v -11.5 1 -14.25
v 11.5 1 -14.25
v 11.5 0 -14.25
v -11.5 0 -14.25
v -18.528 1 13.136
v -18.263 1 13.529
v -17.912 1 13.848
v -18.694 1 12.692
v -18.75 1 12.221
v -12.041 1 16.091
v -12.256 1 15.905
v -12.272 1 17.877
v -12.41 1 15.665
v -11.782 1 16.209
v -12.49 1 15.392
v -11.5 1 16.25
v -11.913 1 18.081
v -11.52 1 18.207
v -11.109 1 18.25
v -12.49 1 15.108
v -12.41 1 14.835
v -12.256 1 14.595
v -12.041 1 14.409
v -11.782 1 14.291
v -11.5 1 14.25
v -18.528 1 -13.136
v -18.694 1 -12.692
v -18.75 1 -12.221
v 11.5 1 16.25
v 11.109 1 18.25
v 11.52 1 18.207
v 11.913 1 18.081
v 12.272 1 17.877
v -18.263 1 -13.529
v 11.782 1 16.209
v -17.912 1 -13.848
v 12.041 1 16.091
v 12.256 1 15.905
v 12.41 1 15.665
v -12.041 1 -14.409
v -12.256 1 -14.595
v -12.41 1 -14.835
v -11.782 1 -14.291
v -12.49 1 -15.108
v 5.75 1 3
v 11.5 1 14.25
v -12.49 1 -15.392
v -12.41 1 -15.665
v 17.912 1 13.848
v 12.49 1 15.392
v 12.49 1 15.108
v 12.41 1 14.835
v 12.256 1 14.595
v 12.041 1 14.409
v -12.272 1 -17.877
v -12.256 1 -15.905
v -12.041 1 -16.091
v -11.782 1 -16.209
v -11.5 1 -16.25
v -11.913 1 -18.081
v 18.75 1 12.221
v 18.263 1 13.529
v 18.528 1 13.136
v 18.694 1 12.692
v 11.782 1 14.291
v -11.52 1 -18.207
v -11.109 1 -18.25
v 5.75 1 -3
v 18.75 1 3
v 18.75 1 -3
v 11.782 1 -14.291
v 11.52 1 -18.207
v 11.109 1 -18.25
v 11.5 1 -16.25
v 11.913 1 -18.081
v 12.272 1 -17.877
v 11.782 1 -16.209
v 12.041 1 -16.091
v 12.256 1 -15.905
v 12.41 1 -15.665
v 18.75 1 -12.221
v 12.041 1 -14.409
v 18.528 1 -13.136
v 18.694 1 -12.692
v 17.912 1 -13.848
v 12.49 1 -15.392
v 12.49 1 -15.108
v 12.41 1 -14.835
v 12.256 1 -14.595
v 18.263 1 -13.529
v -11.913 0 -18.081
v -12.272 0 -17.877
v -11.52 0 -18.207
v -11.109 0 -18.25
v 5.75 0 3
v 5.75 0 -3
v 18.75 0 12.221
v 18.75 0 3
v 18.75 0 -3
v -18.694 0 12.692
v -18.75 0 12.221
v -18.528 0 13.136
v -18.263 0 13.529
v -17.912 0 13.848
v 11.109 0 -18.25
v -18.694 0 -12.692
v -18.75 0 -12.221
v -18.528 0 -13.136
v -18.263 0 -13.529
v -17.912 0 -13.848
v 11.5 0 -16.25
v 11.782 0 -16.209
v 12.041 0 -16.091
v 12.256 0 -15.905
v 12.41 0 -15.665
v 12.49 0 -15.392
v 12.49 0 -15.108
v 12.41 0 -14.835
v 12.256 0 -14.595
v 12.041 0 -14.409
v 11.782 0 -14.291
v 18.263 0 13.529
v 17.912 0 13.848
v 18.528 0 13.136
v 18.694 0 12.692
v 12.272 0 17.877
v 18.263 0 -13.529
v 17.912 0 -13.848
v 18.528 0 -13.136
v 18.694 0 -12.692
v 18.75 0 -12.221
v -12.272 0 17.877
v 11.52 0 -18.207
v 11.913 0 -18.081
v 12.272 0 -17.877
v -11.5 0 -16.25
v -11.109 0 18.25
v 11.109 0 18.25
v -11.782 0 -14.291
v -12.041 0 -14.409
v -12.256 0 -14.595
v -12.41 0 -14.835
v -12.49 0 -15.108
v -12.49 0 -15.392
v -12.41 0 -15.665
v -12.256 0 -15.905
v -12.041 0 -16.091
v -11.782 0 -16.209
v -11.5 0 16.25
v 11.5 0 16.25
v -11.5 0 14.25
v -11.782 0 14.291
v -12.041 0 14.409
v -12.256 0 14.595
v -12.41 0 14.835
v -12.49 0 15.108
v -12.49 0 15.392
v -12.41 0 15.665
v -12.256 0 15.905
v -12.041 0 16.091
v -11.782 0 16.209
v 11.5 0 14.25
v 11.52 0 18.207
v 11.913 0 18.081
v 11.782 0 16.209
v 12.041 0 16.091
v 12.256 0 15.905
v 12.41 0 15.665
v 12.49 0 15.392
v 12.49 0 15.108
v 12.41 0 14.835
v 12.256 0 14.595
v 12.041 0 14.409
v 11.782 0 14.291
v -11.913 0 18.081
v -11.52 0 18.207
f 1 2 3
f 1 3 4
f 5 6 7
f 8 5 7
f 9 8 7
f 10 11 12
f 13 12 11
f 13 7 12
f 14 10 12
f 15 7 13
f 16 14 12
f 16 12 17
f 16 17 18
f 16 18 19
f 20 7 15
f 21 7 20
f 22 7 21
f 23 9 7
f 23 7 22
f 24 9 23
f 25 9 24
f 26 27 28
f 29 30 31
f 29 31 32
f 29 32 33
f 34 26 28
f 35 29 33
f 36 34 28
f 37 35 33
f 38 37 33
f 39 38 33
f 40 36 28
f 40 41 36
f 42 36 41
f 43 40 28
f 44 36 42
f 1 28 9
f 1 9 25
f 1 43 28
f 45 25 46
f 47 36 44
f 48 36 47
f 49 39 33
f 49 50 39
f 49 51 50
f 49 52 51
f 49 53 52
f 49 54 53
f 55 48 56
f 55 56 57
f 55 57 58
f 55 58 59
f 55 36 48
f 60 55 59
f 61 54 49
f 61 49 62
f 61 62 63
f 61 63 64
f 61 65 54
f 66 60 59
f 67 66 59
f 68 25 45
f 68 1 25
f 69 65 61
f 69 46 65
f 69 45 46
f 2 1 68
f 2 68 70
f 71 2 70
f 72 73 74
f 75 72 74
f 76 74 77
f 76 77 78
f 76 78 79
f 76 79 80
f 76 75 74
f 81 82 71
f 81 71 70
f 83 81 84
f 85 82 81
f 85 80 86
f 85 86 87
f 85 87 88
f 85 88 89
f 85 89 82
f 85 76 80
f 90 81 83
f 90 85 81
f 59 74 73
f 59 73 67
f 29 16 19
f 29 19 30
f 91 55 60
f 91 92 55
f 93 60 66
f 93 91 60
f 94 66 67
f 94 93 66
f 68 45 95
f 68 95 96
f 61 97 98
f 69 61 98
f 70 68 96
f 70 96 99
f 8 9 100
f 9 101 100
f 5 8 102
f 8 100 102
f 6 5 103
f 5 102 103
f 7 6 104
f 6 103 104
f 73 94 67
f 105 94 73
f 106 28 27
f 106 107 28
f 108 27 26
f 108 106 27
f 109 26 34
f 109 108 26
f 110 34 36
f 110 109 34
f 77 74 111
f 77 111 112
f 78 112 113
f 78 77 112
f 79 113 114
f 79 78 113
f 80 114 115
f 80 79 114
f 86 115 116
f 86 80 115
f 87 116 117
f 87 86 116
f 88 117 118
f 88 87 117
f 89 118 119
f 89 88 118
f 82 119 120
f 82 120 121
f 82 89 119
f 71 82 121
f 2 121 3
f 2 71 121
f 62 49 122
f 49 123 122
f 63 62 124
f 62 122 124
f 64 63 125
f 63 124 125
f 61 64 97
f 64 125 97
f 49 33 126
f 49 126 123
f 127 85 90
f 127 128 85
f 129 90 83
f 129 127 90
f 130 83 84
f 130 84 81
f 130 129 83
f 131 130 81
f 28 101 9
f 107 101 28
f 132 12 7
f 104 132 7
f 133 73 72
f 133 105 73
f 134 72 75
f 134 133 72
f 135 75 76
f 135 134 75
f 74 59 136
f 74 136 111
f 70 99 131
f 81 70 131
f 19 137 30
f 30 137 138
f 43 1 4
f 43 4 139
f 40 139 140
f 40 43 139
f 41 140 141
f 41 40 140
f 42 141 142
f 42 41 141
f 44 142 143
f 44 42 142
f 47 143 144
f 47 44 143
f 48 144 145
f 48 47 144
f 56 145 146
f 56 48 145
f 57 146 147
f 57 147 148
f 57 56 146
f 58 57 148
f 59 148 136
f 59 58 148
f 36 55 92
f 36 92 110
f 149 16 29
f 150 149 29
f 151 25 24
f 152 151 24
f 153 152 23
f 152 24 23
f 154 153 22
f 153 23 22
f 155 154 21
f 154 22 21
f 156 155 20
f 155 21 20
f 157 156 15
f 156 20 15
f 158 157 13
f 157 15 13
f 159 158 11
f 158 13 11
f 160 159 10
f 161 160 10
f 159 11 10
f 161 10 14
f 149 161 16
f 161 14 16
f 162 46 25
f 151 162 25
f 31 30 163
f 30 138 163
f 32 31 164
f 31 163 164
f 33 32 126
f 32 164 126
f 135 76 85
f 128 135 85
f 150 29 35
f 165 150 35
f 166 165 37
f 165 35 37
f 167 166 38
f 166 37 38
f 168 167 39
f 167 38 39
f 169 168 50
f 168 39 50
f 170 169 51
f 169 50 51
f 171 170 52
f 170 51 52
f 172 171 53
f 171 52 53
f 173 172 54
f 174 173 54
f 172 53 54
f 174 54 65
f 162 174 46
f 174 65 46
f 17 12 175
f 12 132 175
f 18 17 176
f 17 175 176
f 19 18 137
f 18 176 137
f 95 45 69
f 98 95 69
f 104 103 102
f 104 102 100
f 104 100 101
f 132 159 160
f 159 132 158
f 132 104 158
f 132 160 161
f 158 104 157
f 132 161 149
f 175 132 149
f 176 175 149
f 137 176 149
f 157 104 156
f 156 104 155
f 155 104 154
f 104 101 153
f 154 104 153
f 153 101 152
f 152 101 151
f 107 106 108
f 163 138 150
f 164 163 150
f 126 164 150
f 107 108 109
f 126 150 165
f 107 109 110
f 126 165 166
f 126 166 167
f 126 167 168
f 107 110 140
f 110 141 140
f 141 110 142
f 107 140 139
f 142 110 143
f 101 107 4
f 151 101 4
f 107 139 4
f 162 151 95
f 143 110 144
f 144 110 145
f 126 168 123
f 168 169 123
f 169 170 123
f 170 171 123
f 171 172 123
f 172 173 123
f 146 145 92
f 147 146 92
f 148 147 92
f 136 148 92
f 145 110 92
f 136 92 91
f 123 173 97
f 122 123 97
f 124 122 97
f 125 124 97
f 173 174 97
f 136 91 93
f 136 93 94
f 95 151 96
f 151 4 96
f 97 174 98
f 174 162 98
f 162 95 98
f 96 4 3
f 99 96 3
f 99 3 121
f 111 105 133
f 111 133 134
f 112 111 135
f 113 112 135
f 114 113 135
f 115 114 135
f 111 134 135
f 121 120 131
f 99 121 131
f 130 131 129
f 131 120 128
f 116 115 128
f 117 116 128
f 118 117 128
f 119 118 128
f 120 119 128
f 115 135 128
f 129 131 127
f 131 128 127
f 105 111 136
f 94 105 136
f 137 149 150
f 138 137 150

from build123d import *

# Parameters (mm, degrees)
SKETCH_1_W          = 37.5
SKETCH_1_H          = 36.5
EXTRUDE_1_DEPTH     = 1
CUT_EXTRUDE_1_DEPTH = 1
CUT_EXTRUDE_2_DEPTH = 1
FILLET_1_R          = 2
SKETCH_4_W          = 13
SKETCH_4_H          = 6
CUT_EXTRUDE_3_DEPTH = 1


with BuildPart() as part:
    # 草图1 → 凸台-拉伸1 (new body)
    with BuildSketch(Plane(origin=(0, 0, 0), x_dir=(1, 0, 0), z_dir=(0, 1, 0))):
        Rectangle(SKETCH_1_W, SKETCH_1_H)
    extrude(amount=EXTRUDE_1_DEPTH)

    # 草图2 → 切除-拉伸1 (cut)
    with BuildSketch(Plane(origin=(0, 1, 0), x_dir=(1, 0, 0), z_dir=(0, 1, 0))):
        Polygon((-11.75, 18.25), (-18.75, 13.25), (-18.75, 18.25), align=None)
        Polygon((18.75, 18.25), (11.75, 18.25), (18.75, 13.25), align=None)
        Polygon((11.75, -18.25), (18.75, -13.25), (18.75, -18.25), align=None)
        Polygon((-18.75, -18.25), (-11.75, -18.25), (-18.75, -13.25), align=None)
    extrude(amount=-CUT_EXTRUDE_1_DEPTH, mode=Mode.SUBTRACT)

    # 草图3 → 切除-拉伸2 (cut)
    with BuildSketch(Plane(origin=(0, 1, 0), x_dir=(1, 0, 0), z_dir=(0, 1, 0))):
        with BuildLine():
            Line((-11.5, 16.25), (11.5, 16.25))
            ThreePointArc((11.5, 16.25), (12.5, 15.25), (11.5, 14.25))
            Line((11.5, 14.25), (-11.5, 14.25))
            ThreePointArc((-11.5, 14.25), (-12.5, 15.25), (-11.5, 16.25))
        make_face()
        with BuildLine():
            Line((-11.5, -16.25), (11.5, -16.25))
            ThreePointArc((11.5, -16.25), (12.5, -15.25), (11.5, -14.25))
            Line((11.5, -14.25), (-11.5, -14.25))
            ThreePointArc((-11.5, -14.25), (-12.5, -15.25), (-11.5, -16.25))
        make_face()
    extrude(amount=-CUT_EXTRUDE_2_DEPTH, mode=Mode.SUBTRACT)

    # 圆角1
    fillet_1_edges = [part.edges().sort_by_distance(p)[0] for p in [
        (-18.75, 0.5, 13.25),
        (-11.75, 0.5, 18.25),
        (11.75, 0.5, 18.25),
        (18.75, 0.5, 13.25),
        (18.75, 0.5, -13.25),
        (11.75, 0.5, -18.25),
        (-11.75, 0.5, -18.25),
        (-18.75, 0.5, -13.25),
    ]]
    fillet(fillet_1_edges, radius=FILLET_1_R)

    # 草图4 → 切除-拉伸3 (cut)
    with BuildSketch(Plane(origin=(0, 1, 0), x_dir=(1, 0, 0), z_dir=(0, 1, 0))):
        with Locations((12.25, 0)):
            Rectangle(SKETCH_4_W, SKETCH_4_H)
    extrude(amount=-CUT_EXTRUDE_3_DEPTH, mode=Mode.SUBTRACT)


solid = part.part
